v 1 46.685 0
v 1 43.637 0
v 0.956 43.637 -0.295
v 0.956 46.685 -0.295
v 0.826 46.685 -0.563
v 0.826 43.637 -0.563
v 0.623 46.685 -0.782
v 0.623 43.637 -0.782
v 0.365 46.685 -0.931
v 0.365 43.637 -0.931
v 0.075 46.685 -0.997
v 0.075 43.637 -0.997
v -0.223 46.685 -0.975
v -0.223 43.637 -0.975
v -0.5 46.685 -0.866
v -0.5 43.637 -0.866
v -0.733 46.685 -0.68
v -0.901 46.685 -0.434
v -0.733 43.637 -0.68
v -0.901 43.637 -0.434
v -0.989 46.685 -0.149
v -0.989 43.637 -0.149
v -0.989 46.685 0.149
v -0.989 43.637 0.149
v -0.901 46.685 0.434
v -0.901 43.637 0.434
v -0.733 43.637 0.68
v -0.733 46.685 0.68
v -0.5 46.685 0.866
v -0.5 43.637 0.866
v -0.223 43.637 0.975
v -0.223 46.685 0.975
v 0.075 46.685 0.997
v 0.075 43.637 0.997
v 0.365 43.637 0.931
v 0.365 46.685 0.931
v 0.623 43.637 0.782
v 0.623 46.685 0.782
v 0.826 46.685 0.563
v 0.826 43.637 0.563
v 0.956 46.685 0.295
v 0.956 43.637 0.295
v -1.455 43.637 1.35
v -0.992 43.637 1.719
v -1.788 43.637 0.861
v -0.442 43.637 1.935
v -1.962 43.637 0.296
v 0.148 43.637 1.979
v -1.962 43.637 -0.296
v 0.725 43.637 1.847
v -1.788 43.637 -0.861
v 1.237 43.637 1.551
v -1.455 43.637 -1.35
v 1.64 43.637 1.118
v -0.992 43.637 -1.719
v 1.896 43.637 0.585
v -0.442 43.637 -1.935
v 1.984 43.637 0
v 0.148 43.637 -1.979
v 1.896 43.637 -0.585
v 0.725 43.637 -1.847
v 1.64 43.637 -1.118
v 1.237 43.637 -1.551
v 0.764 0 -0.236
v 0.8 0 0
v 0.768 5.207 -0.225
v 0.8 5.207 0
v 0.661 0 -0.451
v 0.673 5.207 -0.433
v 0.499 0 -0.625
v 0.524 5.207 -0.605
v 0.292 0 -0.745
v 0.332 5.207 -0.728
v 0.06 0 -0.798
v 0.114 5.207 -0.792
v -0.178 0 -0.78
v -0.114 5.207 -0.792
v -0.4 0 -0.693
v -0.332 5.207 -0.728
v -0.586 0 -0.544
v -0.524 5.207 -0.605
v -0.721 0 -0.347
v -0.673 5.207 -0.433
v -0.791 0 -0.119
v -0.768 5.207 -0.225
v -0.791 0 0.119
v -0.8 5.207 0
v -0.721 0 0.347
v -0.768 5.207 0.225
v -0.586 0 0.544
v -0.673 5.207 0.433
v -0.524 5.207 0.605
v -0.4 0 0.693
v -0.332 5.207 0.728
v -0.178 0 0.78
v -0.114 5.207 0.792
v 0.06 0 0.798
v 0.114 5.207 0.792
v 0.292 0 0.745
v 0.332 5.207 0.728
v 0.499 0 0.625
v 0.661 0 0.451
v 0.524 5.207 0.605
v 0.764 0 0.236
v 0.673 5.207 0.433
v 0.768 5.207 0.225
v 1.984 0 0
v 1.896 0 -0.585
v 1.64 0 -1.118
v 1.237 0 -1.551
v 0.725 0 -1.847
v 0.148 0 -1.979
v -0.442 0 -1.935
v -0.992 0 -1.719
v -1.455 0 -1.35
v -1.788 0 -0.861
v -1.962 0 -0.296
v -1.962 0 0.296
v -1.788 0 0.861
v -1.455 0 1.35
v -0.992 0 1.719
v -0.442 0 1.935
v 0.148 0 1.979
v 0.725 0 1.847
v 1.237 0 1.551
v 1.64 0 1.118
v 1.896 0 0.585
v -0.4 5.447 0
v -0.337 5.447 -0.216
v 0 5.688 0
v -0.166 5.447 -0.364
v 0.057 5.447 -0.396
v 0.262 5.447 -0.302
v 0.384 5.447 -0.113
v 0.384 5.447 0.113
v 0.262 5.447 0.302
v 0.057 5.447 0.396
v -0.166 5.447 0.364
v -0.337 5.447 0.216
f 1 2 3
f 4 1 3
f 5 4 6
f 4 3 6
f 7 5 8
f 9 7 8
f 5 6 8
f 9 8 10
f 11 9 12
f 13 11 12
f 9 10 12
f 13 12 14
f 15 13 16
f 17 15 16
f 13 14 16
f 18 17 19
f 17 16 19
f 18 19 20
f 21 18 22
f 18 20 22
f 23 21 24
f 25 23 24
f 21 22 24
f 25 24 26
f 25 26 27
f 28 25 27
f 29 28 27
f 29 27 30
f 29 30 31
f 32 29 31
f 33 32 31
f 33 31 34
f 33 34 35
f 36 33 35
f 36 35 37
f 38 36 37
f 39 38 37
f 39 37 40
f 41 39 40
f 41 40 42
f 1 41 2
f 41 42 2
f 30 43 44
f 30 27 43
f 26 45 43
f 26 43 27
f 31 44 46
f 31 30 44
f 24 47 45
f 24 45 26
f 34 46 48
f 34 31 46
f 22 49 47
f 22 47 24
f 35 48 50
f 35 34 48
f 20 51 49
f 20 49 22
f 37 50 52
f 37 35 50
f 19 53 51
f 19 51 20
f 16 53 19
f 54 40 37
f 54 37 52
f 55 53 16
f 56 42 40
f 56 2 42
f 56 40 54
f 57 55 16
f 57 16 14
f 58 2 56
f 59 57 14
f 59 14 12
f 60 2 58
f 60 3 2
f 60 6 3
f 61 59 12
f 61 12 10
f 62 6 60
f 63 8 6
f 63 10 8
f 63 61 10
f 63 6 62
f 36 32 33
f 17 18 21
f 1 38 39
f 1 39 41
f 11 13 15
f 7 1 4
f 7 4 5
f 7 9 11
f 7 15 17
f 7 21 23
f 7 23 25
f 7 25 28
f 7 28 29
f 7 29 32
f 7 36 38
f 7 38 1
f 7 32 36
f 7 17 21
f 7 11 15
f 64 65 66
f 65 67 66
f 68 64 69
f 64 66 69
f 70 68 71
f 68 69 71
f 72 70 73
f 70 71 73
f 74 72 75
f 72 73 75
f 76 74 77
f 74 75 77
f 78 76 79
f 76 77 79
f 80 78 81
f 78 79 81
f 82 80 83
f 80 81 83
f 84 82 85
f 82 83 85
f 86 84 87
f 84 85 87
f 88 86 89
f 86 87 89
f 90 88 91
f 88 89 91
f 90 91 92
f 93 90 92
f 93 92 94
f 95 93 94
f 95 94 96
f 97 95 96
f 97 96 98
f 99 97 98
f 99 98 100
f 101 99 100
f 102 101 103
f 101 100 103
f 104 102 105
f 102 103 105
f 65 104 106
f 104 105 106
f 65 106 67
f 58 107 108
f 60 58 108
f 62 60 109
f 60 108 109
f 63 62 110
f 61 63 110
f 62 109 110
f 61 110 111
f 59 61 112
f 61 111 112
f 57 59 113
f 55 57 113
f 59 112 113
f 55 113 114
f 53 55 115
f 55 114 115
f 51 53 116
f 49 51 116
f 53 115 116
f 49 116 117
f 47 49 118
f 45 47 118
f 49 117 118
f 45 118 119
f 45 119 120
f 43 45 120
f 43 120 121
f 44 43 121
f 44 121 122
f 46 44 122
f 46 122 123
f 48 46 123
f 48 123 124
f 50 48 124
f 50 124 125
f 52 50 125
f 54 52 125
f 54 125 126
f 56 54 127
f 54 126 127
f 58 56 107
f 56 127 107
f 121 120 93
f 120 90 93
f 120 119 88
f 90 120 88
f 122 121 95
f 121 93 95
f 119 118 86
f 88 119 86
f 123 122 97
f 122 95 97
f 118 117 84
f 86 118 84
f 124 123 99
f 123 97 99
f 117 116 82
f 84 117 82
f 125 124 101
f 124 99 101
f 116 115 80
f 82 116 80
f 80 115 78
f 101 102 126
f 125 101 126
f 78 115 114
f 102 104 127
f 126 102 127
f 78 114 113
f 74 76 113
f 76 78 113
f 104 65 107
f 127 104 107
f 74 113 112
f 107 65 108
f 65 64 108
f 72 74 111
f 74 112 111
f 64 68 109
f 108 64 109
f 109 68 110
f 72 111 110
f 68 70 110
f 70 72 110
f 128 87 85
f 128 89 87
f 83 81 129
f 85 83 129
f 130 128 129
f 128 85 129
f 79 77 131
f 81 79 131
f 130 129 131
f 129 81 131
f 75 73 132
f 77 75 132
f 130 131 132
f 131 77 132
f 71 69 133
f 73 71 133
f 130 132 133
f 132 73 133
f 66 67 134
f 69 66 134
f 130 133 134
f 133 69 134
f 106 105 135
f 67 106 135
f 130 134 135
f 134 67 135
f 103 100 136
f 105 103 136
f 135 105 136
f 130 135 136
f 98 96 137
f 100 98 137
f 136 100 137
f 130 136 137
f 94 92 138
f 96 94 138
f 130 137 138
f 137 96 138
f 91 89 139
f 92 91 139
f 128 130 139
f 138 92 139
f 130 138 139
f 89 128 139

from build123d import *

# Parameters (mm, degrees)
SKETCH2_R                 = 1.984375
BOSS_EXTRUDE1_DEPTH       = 43.6372
SKETCH3_R                 = 1
BOSS_EXTRUDE2_DEPTH       = 3.048
M2X0_4_TAPPED_HOLE1_D     = 1.6
M2X0_4_TAPPED_HOLE1_DEPTH = 5.207
M2X0_4_TAPPED_HOLE1_TIP   = 0.480688495


with BuildPart() as part:
    # Sketch2 → Boss-Extrude1 (new body)
    with BuildSketch(Plane(origin=(0, 0, 0), x_dir=(1, 0, 0), z_dir=(0, 1, 0))):
        Circle(SKETCH2_R)
    extrude(amount=BOSS_EXTRUDE1_DEPTH)

    # Sketch3 → Boss-Extrude2 (add)
    with BuildSketch(Plane(origin=(0, 43.6372, 0), x_dir=(1, 0, 0), z_dir=(0, 1, 0))):
        Circle(SKETCH3_R)
    extrude(amount=BOSS_EXTRUDE2_DEPTH)

    # M2x0.4 Tapped Hole1
    with Locations(Plane(origin=(0, 0, 0), x_dir=(-1, 0, 0), z_dir=(0, -1, 0))):
        with Locations((0, 0)):
            Hole(M2X0_4_TAPPED_HOLE1_D / 2, depth=M2X0_4_TAPPED_HOLE1_DEPTH)
            with Locations((0, 0, -(M2X0_4_TAPPED_HOLE1_DEPTH + M2X0_4_TAPPED_HOLE1_TIP / 2))):  # 118° drill point
                Cone(0, M2X0_4_TAPPED_HOLE1_D / 2, M2X0_4_TAPPED_HOLE1_TIP, mode=Mode.SUBTRACT)


solid = part.part
